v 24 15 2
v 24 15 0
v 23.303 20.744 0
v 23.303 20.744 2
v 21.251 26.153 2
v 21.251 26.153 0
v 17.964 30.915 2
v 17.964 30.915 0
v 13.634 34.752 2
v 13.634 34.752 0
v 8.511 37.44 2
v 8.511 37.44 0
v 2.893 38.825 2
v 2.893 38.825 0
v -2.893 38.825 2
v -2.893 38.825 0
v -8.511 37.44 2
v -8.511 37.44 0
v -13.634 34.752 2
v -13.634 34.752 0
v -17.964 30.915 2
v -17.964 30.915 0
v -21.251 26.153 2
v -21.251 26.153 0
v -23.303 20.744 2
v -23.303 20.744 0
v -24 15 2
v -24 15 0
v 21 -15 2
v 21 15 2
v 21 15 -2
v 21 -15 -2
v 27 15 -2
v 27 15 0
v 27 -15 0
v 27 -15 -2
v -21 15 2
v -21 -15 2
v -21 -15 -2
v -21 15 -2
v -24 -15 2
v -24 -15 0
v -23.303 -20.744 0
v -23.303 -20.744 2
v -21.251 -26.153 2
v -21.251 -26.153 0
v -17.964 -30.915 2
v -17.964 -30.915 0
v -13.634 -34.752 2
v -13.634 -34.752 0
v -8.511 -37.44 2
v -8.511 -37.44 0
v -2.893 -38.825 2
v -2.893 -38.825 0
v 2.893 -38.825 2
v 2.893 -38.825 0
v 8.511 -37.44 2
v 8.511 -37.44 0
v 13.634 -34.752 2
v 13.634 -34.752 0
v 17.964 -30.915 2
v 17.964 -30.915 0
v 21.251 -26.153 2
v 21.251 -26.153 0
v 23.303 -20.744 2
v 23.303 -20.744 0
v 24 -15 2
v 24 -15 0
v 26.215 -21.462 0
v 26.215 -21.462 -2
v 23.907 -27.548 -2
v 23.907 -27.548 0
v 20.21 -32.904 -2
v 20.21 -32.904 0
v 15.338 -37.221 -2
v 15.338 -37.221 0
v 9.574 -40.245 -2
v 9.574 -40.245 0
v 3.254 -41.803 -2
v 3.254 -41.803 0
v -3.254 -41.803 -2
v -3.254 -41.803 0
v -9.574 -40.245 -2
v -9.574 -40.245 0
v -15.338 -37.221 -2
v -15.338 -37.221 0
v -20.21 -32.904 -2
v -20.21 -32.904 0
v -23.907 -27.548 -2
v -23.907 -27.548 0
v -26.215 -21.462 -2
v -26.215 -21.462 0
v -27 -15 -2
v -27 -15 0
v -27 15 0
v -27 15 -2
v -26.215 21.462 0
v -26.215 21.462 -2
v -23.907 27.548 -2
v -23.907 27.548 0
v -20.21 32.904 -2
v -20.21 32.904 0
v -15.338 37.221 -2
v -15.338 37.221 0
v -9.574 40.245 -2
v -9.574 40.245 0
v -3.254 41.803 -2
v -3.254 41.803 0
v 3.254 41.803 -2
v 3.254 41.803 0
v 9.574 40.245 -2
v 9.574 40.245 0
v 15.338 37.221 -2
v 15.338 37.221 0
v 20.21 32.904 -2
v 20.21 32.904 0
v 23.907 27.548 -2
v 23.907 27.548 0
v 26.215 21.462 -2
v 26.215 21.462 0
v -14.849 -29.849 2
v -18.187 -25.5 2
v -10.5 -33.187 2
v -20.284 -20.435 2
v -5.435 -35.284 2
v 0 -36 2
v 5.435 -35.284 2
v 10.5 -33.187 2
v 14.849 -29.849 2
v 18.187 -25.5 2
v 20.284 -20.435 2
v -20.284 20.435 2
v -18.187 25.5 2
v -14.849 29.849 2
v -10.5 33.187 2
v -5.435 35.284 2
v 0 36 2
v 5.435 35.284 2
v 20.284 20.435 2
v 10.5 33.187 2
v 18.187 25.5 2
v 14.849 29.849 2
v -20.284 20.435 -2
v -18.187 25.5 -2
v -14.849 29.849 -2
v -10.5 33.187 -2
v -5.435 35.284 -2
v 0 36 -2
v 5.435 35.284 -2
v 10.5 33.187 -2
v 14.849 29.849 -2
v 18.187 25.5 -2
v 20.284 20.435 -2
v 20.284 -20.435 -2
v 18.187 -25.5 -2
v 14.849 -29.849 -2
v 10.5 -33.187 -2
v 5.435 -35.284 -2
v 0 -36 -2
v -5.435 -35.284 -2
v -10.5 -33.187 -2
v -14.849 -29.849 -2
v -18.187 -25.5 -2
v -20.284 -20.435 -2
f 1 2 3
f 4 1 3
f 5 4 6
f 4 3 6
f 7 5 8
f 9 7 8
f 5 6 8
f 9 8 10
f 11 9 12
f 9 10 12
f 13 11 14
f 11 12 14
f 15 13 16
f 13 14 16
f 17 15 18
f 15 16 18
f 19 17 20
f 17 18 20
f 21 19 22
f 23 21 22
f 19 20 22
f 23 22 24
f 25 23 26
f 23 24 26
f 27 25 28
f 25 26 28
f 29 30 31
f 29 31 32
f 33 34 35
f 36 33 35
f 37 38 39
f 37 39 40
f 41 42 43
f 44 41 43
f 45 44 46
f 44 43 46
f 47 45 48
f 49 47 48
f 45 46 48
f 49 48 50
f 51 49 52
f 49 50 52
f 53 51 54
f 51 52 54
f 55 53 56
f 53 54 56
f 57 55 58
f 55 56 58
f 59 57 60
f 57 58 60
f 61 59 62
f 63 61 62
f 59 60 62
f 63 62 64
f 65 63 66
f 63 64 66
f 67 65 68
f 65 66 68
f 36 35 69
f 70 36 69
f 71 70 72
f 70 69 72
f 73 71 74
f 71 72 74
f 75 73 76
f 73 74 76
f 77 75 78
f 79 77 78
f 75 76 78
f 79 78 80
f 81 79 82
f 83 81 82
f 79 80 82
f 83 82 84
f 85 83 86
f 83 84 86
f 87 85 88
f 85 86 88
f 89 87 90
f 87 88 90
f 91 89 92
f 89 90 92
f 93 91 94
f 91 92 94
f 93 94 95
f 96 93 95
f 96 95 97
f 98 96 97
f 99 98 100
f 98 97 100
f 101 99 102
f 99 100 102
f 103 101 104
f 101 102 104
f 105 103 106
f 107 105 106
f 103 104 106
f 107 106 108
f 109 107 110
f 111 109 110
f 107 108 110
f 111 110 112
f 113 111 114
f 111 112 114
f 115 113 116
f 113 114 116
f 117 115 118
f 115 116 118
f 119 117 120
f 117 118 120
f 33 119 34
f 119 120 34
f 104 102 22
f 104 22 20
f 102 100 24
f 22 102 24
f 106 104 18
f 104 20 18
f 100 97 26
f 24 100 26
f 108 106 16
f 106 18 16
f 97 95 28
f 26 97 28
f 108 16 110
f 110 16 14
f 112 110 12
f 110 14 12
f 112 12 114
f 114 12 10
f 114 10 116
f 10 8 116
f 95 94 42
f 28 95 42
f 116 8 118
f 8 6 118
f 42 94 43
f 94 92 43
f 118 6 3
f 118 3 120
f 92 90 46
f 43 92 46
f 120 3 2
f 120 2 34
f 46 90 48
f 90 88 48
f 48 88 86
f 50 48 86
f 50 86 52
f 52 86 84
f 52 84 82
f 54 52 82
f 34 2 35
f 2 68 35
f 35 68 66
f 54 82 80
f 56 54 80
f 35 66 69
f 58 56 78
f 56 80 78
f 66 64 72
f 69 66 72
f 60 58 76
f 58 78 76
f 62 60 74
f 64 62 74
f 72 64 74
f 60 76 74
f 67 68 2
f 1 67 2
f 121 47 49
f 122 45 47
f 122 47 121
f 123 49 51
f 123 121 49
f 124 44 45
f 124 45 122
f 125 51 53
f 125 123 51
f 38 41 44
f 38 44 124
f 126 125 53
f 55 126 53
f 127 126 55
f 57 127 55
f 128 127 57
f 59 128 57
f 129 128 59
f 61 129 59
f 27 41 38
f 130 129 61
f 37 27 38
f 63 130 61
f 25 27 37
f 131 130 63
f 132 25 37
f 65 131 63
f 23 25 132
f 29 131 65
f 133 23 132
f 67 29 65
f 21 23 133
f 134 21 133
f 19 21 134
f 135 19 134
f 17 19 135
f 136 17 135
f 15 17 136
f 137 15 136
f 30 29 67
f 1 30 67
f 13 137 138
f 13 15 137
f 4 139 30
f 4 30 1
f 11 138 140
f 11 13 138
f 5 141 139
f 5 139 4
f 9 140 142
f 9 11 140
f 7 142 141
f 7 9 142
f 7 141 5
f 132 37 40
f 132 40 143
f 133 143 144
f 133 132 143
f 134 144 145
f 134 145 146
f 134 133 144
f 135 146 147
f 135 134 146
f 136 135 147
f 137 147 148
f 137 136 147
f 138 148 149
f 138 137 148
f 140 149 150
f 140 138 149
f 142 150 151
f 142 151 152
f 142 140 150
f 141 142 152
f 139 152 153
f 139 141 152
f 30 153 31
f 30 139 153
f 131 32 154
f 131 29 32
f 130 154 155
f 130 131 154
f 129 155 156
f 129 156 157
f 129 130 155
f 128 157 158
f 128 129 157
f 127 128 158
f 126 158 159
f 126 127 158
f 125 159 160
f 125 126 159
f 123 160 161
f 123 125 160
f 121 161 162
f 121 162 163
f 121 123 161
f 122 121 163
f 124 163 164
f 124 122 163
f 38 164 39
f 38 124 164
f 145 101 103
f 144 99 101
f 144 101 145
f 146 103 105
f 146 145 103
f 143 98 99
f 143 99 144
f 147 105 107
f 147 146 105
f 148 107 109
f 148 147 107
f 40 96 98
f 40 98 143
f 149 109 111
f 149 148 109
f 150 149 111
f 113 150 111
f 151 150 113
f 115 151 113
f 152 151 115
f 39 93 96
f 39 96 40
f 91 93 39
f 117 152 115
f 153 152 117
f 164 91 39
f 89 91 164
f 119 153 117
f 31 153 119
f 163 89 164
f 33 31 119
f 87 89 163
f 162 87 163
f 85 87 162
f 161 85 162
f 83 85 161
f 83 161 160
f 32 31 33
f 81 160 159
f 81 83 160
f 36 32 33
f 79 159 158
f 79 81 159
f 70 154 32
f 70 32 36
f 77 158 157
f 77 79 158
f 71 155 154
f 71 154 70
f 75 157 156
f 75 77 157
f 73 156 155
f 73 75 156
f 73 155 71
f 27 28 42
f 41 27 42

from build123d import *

# Parameters (mm, degrees)
PAD_DEPTH    = 2
PAD001_DEPTH = 2


with BuildPart() as part:
    # Sketch → Pad (new body)
    with BuildSketch(Plane.XY):
        with BuildLine():
            ThreePointArc((24, 15), (0, 39), (-24, 15))
            Line((-24, 15), (-24, -15))
            ThreePointArc((-24, -15), (0, -39), (24, -15))
            Line((24, -15), (24, 15))
        make_face()
        with BuildLine():
            ThreePointArc((21, 15), (0, 36), (-21, 15))
            Line((-21, 15), (-21, -15))
            ThreePointArc((-21, -15), (0, -36), (21, -15))
            Line((21, -15), (21, 15))
        make_face(mode=Mode.SUBTRACT)
    extrude(amount=PAD_DEPTH)

    # Sketch001 (on Face9 of Pad) → Pad001 (join)
    with BuildSketch(Plane(origin=(0, 0, 0), x_dir=(1, 0, 0), z_dir=(0, 0, -1))):
        with BuildLine():
            ThreePointArc((27, 15), (0, 42), (-27, 15))
            Line((-27, 15), (-27, -15))
            ThreePointArc((-27, -15), (0, -42), (27, -15))
            Line((27, -15), (27, 15))
        make_face()
        with BuildLine():
            ThreePointArc((21, 15), (0, 36), (-21, 15))
            Line((-21, 15), (-21, -15))
            ThreePointArc((-21, -15), (0, -36), (21, -15))
            Line((21, -15), (21, 15))
        make_face(mode=Mode.SUBTRACT)
    extrude(amount=PAD001_DEPTH)


solid = part.part
